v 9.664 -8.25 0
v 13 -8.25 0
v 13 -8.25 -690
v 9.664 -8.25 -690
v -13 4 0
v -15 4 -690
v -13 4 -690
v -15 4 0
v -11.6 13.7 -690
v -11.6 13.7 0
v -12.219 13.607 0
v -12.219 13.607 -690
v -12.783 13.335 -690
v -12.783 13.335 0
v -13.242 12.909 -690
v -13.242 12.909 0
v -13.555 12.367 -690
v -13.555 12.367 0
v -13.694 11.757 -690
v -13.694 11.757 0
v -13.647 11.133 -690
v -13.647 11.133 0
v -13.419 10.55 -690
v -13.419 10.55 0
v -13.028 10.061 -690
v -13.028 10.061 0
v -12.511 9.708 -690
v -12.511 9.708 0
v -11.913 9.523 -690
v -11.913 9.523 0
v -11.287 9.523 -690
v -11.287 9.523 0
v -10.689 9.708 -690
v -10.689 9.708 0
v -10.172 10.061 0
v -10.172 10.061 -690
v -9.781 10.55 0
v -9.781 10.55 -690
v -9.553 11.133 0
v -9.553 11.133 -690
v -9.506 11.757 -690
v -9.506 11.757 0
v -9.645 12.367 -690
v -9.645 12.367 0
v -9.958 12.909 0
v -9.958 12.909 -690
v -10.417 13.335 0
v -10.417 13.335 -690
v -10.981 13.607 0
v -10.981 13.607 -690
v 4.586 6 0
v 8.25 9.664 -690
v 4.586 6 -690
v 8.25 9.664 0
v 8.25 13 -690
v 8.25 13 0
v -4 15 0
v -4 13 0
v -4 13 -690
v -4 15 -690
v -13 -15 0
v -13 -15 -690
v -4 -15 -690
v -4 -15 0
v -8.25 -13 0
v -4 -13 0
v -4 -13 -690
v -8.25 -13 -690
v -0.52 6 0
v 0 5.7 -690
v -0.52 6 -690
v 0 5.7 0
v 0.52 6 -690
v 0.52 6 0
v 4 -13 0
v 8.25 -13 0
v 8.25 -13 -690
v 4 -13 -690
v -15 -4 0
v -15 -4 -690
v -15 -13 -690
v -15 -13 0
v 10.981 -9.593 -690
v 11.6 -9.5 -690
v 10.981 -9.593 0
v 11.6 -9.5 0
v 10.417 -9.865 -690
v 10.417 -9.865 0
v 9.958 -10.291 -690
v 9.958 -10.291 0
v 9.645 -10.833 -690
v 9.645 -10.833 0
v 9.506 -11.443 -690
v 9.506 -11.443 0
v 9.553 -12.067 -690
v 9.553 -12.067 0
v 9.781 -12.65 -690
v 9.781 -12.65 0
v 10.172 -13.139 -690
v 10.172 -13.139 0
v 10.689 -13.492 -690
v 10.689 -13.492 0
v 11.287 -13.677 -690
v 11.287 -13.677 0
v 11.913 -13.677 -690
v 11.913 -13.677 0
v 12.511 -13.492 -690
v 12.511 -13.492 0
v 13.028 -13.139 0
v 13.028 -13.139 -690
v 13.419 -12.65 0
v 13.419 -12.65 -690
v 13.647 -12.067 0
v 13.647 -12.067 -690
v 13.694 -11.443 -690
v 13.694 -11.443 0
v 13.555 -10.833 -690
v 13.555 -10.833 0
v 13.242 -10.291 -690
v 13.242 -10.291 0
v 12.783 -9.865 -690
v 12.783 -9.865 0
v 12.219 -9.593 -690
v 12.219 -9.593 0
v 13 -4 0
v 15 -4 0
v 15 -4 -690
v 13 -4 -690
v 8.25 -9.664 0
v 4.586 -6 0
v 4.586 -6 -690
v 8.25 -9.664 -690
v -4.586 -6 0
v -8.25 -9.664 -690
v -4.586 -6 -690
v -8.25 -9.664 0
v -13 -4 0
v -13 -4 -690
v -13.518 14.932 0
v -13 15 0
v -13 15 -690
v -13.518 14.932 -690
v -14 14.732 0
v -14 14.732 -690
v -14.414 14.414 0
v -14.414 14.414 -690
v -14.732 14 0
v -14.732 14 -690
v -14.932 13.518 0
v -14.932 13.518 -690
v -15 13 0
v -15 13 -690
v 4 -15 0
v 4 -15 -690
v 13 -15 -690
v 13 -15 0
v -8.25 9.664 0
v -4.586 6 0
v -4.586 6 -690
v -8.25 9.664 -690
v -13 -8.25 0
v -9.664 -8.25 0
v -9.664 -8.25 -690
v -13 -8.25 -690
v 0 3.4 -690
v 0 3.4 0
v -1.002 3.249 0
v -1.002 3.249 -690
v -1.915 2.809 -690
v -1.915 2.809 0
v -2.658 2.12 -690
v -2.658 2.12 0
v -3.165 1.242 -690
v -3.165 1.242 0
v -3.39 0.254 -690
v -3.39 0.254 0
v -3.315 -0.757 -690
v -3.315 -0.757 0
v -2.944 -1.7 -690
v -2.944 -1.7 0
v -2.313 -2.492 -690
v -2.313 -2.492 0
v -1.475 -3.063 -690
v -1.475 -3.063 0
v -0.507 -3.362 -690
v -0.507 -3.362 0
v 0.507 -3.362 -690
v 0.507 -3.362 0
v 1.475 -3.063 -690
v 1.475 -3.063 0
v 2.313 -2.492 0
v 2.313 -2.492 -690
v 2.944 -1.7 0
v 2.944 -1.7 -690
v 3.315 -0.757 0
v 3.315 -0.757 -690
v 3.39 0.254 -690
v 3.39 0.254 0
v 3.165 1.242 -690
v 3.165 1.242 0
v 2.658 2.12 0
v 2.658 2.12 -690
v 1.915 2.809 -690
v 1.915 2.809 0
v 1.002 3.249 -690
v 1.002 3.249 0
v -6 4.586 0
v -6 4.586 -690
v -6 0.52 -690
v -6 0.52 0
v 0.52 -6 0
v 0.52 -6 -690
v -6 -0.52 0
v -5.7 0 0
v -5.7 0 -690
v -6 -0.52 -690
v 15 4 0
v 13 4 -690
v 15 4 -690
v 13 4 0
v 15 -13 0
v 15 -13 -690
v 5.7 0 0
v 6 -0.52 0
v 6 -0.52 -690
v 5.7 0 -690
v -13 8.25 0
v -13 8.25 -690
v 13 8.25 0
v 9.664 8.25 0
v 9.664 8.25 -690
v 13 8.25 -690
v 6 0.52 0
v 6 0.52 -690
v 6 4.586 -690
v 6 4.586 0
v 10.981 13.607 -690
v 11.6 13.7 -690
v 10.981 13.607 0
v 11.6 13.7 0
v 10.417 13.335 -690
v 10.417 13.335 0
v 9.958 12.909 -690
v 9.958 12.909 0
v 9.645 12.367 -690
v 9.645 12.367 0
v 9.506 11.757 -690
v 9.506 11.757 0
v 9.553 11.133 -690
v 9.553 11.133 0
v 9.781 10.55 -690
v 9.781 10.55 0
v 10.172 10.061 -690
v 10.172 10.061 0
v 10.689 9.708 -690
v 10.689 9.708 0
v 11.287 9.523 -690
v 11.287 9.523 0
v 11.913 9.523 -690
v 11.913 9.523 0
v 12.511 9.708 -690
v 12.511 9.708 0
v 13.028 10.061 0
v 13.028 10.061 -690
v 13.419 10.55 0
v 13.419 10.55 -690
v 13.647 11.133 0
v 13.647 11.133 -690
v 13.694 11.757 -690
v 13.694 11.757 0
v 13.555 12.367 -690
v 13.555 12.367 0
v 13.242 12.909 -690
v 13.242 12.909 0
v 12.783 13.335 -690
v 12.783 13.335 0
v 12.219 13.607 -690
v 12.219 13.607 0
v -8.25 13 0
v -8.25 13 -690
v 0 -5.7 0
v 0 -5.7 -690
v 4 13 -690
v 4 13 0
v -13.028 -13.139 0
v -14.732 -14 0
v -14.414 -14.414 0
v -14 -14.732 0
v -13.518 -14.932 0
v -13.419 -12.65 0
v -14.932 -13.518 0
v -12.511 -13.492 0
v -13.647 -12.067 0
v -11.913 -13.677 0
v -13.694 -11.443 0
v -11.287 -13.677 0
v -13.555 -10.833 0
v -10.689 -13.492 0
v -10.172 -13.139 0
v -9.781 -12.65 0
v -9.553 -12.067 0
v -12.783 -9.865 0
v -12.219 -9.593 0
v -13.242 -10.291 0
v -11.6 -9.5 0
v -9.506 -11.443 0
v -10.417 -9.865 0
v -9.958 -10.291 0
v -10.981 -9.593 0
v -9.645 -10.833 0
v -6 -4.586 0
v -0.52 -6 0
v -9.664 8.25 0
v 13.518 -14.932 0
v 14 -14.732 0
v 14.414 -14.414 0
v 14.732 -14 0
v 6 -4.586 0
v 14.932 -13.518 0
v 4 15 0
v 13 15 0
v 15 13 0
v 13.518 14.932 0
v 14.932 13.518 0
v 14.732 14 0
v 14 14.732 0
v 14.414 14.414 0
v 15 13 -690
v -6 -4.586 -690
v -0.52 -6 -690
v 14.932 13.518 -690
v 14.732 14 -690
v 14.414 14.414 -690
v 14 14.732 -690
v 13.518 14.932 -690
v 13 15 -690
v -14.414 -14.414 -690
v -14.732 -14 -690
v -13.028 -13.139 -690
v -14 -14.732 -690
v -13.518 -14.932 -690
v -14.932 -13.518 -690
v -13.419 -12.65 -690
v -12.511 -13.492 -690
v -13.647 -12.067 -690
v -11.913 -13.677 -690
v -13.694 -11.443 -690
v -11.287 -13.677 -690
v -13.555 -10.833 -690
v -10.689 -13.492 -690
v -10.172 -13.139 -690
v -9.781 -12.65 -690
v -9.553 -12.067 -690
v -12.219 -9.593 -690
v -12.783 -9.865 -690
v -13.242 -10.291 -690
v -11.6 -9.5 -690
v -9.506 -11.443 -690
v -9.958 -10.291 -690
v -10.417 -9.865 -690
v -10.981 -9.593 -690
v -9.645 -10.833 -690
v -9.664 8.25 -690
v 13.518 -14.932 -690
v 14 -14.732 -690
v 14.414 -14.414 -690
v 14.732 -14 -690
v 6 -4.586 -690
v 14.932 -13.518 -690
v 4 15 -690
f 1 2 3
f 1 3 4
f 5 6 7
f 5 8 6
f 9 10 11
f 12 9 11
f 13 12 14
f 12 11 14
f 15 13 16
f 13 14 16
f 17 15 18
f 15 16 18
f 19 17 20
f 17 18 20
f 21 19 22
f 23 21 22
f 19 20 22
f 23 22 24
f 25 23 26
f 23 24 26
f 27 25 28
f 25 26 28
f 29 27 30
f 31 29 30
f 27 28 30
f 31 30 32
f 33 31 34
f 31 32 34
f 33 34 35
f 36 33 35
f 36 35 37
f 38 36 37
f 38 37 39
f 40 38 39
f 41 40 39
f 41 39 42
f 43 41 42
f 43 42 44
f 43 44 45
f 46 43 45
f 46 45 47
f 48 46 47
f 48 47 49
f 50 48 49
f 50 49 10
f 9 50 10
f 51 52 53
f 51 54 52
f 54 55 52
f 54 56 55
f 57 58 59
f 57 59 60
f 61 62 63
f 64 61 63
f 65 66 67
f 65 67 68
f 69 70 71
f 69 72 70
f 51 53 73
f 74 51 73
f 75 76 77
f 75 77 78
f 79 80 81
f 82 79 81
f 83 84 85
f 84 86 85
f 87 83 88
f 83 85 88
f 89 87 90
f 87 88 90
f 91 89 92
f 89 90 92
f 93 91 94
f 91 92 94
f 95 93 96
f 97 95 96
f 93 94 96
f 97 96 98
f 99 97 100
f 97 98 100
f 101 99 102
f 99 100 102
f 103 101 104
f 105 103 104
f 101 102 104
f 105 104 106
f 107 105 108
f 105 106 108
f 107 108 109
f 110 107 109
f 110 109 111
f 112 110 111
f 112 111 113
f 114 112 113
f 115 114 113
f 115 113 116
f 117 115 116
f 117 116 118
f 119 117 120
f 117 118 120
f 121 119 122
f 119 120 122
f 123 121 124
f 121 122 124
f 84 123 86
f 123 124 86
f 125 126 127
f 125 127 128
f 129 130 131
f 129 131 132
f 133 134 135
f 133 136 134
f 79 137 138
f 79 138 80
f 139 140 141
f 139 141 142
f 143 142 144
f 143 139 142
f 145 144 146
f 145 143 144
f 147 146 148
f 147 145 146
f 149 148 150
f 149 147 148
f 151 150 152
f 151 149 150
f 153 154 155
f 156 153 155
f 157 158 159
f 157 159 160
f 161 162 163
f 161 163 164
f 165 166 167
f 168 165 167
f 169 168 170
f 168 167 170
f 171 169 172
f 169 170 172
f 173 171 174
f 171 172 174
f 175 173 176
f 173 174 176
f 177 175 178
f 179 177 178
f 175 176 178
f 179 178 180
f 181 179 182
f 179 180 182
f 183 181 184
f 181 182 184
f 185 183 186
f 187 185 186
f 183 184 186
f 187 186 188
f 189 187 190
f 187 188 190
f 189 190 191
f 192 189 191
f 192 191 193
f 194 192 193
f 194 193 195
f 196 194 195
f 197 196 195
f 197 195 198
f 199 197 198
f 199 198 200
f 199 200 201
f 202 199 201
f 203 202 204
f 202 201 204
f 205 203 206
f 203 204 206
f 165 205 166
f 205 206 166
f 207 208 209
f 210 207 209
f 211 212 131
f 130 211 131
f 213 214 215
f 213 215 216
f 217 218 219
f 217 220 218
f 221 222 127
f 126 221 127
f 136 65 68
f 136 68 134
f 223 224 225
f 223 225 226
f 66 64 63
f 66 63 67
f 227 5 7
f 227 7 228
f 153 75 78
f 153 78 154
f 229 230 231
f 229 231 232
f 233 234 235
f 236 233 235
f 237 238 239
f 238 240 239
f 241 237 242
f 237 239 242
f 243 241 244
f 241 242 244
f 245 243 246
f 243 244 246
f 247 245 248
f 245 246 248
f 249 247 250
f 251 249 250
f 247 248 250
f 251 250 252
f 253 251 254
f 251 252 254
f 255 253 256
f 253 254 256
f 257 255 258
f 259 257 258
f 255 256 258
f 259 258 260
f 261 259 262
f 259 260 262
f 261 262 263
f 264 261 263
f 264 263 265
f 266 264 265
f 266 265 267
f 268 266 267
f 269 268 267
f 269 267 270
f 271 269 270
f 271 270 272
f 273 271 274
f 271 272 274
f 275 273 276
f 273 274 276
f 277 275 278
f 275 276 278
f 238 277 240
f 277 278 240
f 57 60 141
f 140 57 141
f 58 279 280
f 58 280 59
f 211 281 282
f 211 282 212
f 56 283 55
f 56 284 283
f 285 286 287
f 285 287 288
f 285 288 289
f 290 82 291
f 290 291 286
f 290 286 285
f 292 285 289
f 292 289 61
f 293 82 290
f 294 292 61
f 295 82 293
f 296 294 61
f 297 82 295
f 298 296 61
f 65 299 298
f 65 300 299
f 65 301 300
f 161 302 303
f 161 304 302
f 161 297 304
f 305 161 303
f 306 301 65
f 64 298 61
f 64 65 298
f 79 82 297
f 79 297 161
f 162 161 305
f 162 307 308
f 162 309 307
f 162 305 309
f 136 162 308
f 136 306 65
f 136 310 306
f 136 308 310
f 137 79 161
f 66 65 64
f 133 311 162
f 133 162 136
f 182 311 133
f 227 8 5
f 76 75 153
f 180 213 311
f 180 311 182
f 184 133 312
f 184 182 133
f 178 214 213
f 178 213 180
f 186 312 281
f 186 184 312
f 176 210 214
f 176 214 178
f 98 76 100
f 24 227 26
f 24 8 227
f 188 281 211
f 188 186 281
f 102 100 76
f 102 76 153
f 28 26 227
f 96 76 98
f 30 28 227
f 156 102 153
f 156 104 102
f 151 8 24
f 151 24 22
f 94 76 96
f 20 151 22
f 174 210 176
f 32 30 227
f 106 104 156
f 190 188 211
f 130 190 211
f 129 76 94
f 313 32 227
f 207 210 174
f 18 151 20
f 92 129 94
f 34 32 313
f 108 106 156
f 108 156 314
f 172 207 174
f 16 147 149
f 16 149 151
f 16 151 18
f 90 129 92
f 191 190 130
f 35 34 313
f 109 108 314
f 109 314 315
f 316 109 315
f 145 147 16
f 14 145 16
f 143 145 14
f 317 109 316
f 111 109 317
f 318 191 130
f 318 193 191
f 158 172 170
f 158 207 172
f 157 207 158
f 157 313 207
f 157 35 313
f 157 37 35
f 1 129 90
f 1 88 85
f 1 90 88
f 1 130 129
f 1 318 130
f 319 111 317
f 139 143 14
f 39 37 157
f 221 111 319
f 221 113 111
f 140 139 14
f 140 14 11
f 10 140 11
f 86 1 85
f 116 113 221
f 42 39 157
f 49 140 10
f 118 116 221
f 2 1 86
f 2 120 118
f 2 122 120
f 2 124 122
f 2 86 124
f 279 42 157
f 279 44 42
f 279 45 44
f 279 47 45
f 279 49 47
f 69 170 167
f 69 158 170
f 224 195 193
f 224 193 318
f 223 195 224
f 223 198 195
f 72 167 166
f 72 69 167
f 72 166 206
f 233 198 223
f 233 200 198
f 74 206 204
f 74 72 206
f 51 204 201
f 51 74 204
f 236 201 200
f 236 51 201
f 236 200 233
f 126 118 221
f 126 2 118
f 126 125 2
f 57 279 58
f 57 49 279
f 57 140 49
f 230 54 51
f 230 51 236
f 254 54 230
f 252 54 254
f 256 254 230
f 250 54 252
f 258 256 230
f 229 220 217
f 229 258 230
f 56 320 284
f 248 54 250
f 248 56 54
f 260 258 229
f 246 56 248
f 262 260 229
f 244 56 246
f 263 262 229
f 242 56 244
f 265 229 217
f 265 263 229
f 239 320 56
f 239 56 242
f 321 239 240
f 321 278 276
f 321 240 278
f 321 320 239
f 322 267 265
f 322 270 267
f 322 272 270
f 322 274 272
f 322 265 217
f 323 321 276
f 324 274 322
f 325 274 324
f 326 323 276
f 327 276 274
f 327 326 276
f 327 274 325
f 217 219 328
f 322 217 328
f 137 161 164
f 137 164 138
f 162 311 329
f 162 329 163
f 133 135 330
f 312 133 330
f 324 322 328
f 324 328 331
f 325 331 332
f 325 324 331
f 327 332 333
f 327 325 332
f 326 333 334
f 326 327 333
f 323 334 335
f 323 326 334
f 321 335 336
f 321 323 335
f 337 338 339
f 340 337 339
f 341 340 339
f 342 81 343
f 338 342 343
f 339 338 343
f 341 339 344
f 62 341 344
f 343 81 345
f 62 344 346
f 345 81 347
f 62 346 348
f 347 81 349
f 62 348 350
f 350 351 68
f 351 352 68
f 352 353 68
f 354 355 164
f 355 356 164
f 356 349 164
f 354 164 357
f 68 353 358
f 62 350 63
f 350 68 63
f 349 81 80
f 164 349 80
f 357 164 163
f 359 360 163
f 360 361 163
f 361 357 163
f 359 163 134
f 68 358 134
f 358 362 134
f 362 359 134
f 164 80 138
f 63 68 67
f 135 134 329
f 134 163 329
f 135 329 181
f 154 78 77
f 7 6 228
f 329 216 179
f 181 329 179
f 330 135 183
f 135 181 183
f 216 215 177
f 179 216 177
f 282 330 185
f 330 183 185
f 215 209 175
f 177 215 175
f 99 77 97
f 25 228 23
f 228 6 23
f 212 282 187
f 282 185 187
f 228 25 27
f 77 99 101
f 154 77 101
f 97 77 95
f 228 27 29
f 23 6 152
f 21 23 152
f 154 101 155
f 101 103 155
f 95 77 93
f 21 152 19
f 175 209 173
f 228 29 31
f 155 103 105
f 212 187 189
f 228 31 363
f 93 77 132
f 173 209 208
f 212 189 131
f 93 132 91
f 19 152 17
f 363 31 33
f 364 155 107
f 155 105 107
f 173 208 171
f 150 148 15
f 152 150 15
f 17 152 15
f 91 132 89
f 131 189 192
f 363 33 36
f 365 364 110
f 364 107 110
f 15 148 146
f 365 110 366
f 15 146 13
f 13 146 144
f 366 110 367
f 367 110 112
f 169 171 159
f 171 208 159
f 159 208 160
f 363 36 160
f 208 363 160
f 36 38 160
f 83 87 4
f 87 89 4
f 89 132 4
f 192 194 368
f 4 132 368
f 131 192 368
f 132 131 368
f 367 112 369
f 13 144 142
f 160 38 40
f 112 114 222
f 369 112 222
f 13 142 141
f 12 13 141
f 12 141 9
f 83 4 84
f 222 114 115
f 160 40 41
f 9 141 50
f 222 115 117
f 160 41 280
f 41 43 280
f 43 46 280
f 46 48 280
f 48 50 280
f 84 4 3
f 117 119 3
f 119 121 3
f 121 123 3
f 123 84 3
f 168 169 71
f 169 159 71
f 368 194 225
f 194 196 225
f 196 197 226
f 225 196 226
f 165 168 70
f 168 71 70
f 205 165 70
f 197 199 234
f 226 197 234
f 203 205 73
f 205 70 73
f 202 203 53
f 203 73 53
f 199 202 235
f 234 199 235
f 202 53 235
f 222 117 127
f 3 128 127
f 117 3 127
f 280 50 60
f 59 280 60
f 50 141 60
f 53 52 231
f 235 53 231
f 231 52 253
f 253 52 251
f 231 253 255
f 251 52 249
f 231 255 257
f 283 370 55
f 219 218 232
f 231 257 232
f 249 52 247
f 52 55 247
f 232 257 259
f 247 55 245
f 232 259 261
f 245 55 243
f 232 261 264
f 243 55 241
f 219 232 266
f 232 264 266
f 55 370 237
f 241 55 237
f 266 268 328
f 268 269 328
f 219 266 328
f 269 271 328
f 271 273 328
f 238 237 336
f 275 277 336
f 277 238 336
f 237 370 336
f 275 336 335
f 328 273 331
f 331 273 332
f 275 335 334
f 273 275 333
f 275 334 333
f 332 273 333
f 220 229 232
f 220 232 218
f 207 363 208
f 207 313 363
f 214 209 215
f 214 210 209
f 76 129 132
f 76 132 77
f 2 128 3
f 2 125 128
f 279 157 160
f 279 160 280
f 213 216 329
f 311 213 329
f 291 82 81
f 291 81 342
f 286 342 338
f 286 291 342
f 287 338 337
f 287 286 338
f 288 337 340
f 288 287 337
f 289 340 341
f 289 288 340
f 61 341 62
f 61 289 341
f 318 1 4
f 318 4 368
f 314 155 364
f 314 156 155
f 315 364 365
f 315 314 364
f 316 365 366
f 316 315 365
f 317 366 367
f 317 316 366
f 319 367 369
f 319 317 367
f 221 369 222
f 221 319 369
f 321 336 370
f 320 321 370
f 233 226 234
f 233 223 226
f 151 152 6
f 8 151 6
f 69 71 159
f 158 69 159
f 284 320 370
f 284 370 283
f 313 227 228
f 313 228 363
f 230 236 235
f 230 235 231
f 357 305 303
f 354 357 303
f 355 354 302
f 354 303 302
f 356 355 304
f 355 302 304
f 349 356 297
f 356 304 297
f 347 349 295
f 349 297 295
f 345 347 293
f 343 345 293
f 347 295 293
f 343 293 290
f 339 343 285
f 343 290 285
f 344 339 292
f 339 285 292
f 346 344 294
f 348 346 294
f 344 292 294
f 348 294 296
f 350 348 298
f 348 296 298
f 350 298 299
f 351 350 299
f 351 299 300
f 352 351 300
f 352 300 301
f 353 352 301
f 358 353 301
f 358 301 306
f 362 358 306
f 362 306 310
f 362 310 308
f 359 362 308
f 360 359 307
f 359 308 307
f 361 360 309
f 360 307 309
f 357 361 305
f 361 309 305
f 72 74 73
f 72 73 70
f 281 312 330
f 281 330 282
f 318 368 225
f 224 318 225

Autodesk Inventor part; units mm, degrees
sketch "Sketch_1" plane through (0, 0, 0) normal (0, 0, 1) x (1, 0, 0)
  line L0 (-15, -4) -> (-15, -13)
  arc A0 (-15, -13) -> (-13, -15) centre (-13, -13) ccw
  line L1 (-13, -15) -> (-4, -15)
  line L2 (-4, -15) -> (-4, -13)
  line L3 (-4, -13) -> (-8.25, -13)
  line L4 (-8.25, -13) -> (-8.25, -9.6642)
  line L5 (-8.25, -9.6642) -> (-4.5858, -6)
  line L6 (-4.5858, -6) -> (-0.5196, -6)
  line L7 (-0.5196, -6) -> (0, -5.7)
  line L8 (0, -5.7) -> (0.5196, -6)
  line L9 (0.5196, -6) -> (4.5858, -6)
  line L10 (4.5858, -6) -> (8.25, -9.6642)
  line L11 (8.25, -9.6642) -> (8.25, -13)
  line L12 (8.25, -13) -> (4, -13)
  line L13 (4, -13) -> (4, -15)
  line L14 (4, -15) -> (13, -15)
  arc A1 (13, -15) -> (15, -13) centre (13, -13) ccw
  line L15 (15, -13) -> (15, -4)
  line L16 (15, -4) -> (13, -4)
  line L17 (13, -4) -> (13, -8.25)
  line L18 (13, -8.25) -> (9.6642, -8.25)
  line L19 (9.6642, -8.25) -> (6, -4.5858)
  line L20 (6, -4.5858) -> (6, -0.5196)
  line L21 (6, -0.5196) -> (5.7, 0)
  line L22 (5.7, 0) -> (6, 0.5196)
  line L23 (6, 0.5196) -> (6, 4.5858)
  line L24 (6, 4.5858) -> (9.6642, 8.25)
  line L25 (9.6642, 8.25) -> (13, 8.25)
  line L26 (13, 8.25) -> (13, 4)
  line L27 (13, 4) -> (15, 4)
  line L28 (15, 4) -> (15, 13)
  arc A2 (15, 13) -> (13, 15) centre (13, 13) ccw
  line L29 (13, 15) -> (4, 15)
  line L30 (4, 15) -> (4, 13)
  line L31 (4, 13) -> (8.25, 13)
  line L32 (8.25, 13) -> (8.25, 9.6642)
  line L33 (8.25, 9.6642) -> (4.5858, 6)
  line L34 (4.5858, 6) -> (0.5196, 6)
  line L35 (0.5196, 6) -> (0, 5.7)
  line L36 (0, 5.7) -> (-0.5196, 6)
  line L37 (-0.5196, 6) -> (-4.5858, 6)
  line L38 (-4.5858, 6) -> (-8.25, 9.6642)
  line L39 (-8.25, 9.6642) -> (-8.25, 13)
  line L40 (-8.25, 13) -> (-4, 13)
  line L41 (-4, 13) -> (-4, 15)
  line L42 (-4, 15) -> (-13, 15)
  arc A3 (-13, 15) -> (-15, 13) centre (-13, 13) ccw
  line L43 (-15, 13) -> (-15, 4)
  line L44 (-15, 4) -> (-13, 4)
  line L45 (-13, 4) -> (-13, 8.25)
  line L46 (-13, 8.25) -> (-9.6642, 8.25)
  line L47 (-9.6642, 8.25) -> (-6, 4.5858)
  line L48 (-6, 4.5858) -> (-6, 0.5196)
  line L49 (-6, 0.5196) -> (-5.7, 0)
  line L50 (-5.7, 0) -> (-6, -0.5196)
  line L51 (-6, -0.5196) -> (-6, -4.5858)
  line L52 (-6, -4.5858) -> (-9.6642, -8.25)
  line L53 (-9.6642, -8.25) -> (-13, -8.25)
  line L54 (-13, -8.25) -> (-13, -4)
  line L55 (-13, -4) -> (-15, -4)
extrude "Extrusion1" add sketch "Sketch_1" against normal blind 690
sketch "Sketch2" plane through (0, 0, -690) normal (0, 0, -1) x (-1, 0, 0)
  point P0 (0, 0)
hole "Hole1" at (0, 0, -690) direction (0, 0, 1) diameter 6.8 depth 690
sketch "Sketch3" plane through (0, 0, -690) normal (0, 0, -1) x (-1, 0, 0)
  point P0 (-11.6, 11.6)
hole "Hole2" at (11.6, 11.6, -690) direction (0, 0, 1) diameter 4.2 depth 690
pattern_linear "Rectangular Pattern1" count 2 spacing 23.2 along (-1, 0, 0) count 2 spacing 23.2 along (0, -1, 0) of "Hole2"
ref_plane "C1_XY" through (0, 0, 0) normal (0, 0, 1) x (1, 0, 0)
ref_plane "C1_YZ" through (0, 0, 0) normal (1, 0, 0) x (0, 1, 0)
ref_plane "C1_ZX" through (0, 0, 0) normal (0, 1, 0) x (0, 0, 1)
ref_plane "to_frame_cap1_XY" through (0, 0, 0) normal (0, 0, 1) x (1, 0, 0)
ref_plane "to_frame_cap1_YZ" through (0, 0, 0) normal (1, 0, 0) x (0, 1, 0)
ref_plane "to_frame_cap1_ZX" through (0, 0, 0) normal (0, 1, 0) x (0, 0, 1)
ref_plane "to_frame_cap2_XY" through (0, 0, -690) normal (0, 0, -1) x (1, 0, 0)
ref_plane "to_frame_cap2_YZ" through (0, 0, -690) normal (1, 0, 0) x (0, -1, 0)
ref_plane "to_frame_cap2_ZX" through (0, 0, -690) normal (0, -1, 0) x (0, 0, -1)
properties part number "HFS6-3030-690"
